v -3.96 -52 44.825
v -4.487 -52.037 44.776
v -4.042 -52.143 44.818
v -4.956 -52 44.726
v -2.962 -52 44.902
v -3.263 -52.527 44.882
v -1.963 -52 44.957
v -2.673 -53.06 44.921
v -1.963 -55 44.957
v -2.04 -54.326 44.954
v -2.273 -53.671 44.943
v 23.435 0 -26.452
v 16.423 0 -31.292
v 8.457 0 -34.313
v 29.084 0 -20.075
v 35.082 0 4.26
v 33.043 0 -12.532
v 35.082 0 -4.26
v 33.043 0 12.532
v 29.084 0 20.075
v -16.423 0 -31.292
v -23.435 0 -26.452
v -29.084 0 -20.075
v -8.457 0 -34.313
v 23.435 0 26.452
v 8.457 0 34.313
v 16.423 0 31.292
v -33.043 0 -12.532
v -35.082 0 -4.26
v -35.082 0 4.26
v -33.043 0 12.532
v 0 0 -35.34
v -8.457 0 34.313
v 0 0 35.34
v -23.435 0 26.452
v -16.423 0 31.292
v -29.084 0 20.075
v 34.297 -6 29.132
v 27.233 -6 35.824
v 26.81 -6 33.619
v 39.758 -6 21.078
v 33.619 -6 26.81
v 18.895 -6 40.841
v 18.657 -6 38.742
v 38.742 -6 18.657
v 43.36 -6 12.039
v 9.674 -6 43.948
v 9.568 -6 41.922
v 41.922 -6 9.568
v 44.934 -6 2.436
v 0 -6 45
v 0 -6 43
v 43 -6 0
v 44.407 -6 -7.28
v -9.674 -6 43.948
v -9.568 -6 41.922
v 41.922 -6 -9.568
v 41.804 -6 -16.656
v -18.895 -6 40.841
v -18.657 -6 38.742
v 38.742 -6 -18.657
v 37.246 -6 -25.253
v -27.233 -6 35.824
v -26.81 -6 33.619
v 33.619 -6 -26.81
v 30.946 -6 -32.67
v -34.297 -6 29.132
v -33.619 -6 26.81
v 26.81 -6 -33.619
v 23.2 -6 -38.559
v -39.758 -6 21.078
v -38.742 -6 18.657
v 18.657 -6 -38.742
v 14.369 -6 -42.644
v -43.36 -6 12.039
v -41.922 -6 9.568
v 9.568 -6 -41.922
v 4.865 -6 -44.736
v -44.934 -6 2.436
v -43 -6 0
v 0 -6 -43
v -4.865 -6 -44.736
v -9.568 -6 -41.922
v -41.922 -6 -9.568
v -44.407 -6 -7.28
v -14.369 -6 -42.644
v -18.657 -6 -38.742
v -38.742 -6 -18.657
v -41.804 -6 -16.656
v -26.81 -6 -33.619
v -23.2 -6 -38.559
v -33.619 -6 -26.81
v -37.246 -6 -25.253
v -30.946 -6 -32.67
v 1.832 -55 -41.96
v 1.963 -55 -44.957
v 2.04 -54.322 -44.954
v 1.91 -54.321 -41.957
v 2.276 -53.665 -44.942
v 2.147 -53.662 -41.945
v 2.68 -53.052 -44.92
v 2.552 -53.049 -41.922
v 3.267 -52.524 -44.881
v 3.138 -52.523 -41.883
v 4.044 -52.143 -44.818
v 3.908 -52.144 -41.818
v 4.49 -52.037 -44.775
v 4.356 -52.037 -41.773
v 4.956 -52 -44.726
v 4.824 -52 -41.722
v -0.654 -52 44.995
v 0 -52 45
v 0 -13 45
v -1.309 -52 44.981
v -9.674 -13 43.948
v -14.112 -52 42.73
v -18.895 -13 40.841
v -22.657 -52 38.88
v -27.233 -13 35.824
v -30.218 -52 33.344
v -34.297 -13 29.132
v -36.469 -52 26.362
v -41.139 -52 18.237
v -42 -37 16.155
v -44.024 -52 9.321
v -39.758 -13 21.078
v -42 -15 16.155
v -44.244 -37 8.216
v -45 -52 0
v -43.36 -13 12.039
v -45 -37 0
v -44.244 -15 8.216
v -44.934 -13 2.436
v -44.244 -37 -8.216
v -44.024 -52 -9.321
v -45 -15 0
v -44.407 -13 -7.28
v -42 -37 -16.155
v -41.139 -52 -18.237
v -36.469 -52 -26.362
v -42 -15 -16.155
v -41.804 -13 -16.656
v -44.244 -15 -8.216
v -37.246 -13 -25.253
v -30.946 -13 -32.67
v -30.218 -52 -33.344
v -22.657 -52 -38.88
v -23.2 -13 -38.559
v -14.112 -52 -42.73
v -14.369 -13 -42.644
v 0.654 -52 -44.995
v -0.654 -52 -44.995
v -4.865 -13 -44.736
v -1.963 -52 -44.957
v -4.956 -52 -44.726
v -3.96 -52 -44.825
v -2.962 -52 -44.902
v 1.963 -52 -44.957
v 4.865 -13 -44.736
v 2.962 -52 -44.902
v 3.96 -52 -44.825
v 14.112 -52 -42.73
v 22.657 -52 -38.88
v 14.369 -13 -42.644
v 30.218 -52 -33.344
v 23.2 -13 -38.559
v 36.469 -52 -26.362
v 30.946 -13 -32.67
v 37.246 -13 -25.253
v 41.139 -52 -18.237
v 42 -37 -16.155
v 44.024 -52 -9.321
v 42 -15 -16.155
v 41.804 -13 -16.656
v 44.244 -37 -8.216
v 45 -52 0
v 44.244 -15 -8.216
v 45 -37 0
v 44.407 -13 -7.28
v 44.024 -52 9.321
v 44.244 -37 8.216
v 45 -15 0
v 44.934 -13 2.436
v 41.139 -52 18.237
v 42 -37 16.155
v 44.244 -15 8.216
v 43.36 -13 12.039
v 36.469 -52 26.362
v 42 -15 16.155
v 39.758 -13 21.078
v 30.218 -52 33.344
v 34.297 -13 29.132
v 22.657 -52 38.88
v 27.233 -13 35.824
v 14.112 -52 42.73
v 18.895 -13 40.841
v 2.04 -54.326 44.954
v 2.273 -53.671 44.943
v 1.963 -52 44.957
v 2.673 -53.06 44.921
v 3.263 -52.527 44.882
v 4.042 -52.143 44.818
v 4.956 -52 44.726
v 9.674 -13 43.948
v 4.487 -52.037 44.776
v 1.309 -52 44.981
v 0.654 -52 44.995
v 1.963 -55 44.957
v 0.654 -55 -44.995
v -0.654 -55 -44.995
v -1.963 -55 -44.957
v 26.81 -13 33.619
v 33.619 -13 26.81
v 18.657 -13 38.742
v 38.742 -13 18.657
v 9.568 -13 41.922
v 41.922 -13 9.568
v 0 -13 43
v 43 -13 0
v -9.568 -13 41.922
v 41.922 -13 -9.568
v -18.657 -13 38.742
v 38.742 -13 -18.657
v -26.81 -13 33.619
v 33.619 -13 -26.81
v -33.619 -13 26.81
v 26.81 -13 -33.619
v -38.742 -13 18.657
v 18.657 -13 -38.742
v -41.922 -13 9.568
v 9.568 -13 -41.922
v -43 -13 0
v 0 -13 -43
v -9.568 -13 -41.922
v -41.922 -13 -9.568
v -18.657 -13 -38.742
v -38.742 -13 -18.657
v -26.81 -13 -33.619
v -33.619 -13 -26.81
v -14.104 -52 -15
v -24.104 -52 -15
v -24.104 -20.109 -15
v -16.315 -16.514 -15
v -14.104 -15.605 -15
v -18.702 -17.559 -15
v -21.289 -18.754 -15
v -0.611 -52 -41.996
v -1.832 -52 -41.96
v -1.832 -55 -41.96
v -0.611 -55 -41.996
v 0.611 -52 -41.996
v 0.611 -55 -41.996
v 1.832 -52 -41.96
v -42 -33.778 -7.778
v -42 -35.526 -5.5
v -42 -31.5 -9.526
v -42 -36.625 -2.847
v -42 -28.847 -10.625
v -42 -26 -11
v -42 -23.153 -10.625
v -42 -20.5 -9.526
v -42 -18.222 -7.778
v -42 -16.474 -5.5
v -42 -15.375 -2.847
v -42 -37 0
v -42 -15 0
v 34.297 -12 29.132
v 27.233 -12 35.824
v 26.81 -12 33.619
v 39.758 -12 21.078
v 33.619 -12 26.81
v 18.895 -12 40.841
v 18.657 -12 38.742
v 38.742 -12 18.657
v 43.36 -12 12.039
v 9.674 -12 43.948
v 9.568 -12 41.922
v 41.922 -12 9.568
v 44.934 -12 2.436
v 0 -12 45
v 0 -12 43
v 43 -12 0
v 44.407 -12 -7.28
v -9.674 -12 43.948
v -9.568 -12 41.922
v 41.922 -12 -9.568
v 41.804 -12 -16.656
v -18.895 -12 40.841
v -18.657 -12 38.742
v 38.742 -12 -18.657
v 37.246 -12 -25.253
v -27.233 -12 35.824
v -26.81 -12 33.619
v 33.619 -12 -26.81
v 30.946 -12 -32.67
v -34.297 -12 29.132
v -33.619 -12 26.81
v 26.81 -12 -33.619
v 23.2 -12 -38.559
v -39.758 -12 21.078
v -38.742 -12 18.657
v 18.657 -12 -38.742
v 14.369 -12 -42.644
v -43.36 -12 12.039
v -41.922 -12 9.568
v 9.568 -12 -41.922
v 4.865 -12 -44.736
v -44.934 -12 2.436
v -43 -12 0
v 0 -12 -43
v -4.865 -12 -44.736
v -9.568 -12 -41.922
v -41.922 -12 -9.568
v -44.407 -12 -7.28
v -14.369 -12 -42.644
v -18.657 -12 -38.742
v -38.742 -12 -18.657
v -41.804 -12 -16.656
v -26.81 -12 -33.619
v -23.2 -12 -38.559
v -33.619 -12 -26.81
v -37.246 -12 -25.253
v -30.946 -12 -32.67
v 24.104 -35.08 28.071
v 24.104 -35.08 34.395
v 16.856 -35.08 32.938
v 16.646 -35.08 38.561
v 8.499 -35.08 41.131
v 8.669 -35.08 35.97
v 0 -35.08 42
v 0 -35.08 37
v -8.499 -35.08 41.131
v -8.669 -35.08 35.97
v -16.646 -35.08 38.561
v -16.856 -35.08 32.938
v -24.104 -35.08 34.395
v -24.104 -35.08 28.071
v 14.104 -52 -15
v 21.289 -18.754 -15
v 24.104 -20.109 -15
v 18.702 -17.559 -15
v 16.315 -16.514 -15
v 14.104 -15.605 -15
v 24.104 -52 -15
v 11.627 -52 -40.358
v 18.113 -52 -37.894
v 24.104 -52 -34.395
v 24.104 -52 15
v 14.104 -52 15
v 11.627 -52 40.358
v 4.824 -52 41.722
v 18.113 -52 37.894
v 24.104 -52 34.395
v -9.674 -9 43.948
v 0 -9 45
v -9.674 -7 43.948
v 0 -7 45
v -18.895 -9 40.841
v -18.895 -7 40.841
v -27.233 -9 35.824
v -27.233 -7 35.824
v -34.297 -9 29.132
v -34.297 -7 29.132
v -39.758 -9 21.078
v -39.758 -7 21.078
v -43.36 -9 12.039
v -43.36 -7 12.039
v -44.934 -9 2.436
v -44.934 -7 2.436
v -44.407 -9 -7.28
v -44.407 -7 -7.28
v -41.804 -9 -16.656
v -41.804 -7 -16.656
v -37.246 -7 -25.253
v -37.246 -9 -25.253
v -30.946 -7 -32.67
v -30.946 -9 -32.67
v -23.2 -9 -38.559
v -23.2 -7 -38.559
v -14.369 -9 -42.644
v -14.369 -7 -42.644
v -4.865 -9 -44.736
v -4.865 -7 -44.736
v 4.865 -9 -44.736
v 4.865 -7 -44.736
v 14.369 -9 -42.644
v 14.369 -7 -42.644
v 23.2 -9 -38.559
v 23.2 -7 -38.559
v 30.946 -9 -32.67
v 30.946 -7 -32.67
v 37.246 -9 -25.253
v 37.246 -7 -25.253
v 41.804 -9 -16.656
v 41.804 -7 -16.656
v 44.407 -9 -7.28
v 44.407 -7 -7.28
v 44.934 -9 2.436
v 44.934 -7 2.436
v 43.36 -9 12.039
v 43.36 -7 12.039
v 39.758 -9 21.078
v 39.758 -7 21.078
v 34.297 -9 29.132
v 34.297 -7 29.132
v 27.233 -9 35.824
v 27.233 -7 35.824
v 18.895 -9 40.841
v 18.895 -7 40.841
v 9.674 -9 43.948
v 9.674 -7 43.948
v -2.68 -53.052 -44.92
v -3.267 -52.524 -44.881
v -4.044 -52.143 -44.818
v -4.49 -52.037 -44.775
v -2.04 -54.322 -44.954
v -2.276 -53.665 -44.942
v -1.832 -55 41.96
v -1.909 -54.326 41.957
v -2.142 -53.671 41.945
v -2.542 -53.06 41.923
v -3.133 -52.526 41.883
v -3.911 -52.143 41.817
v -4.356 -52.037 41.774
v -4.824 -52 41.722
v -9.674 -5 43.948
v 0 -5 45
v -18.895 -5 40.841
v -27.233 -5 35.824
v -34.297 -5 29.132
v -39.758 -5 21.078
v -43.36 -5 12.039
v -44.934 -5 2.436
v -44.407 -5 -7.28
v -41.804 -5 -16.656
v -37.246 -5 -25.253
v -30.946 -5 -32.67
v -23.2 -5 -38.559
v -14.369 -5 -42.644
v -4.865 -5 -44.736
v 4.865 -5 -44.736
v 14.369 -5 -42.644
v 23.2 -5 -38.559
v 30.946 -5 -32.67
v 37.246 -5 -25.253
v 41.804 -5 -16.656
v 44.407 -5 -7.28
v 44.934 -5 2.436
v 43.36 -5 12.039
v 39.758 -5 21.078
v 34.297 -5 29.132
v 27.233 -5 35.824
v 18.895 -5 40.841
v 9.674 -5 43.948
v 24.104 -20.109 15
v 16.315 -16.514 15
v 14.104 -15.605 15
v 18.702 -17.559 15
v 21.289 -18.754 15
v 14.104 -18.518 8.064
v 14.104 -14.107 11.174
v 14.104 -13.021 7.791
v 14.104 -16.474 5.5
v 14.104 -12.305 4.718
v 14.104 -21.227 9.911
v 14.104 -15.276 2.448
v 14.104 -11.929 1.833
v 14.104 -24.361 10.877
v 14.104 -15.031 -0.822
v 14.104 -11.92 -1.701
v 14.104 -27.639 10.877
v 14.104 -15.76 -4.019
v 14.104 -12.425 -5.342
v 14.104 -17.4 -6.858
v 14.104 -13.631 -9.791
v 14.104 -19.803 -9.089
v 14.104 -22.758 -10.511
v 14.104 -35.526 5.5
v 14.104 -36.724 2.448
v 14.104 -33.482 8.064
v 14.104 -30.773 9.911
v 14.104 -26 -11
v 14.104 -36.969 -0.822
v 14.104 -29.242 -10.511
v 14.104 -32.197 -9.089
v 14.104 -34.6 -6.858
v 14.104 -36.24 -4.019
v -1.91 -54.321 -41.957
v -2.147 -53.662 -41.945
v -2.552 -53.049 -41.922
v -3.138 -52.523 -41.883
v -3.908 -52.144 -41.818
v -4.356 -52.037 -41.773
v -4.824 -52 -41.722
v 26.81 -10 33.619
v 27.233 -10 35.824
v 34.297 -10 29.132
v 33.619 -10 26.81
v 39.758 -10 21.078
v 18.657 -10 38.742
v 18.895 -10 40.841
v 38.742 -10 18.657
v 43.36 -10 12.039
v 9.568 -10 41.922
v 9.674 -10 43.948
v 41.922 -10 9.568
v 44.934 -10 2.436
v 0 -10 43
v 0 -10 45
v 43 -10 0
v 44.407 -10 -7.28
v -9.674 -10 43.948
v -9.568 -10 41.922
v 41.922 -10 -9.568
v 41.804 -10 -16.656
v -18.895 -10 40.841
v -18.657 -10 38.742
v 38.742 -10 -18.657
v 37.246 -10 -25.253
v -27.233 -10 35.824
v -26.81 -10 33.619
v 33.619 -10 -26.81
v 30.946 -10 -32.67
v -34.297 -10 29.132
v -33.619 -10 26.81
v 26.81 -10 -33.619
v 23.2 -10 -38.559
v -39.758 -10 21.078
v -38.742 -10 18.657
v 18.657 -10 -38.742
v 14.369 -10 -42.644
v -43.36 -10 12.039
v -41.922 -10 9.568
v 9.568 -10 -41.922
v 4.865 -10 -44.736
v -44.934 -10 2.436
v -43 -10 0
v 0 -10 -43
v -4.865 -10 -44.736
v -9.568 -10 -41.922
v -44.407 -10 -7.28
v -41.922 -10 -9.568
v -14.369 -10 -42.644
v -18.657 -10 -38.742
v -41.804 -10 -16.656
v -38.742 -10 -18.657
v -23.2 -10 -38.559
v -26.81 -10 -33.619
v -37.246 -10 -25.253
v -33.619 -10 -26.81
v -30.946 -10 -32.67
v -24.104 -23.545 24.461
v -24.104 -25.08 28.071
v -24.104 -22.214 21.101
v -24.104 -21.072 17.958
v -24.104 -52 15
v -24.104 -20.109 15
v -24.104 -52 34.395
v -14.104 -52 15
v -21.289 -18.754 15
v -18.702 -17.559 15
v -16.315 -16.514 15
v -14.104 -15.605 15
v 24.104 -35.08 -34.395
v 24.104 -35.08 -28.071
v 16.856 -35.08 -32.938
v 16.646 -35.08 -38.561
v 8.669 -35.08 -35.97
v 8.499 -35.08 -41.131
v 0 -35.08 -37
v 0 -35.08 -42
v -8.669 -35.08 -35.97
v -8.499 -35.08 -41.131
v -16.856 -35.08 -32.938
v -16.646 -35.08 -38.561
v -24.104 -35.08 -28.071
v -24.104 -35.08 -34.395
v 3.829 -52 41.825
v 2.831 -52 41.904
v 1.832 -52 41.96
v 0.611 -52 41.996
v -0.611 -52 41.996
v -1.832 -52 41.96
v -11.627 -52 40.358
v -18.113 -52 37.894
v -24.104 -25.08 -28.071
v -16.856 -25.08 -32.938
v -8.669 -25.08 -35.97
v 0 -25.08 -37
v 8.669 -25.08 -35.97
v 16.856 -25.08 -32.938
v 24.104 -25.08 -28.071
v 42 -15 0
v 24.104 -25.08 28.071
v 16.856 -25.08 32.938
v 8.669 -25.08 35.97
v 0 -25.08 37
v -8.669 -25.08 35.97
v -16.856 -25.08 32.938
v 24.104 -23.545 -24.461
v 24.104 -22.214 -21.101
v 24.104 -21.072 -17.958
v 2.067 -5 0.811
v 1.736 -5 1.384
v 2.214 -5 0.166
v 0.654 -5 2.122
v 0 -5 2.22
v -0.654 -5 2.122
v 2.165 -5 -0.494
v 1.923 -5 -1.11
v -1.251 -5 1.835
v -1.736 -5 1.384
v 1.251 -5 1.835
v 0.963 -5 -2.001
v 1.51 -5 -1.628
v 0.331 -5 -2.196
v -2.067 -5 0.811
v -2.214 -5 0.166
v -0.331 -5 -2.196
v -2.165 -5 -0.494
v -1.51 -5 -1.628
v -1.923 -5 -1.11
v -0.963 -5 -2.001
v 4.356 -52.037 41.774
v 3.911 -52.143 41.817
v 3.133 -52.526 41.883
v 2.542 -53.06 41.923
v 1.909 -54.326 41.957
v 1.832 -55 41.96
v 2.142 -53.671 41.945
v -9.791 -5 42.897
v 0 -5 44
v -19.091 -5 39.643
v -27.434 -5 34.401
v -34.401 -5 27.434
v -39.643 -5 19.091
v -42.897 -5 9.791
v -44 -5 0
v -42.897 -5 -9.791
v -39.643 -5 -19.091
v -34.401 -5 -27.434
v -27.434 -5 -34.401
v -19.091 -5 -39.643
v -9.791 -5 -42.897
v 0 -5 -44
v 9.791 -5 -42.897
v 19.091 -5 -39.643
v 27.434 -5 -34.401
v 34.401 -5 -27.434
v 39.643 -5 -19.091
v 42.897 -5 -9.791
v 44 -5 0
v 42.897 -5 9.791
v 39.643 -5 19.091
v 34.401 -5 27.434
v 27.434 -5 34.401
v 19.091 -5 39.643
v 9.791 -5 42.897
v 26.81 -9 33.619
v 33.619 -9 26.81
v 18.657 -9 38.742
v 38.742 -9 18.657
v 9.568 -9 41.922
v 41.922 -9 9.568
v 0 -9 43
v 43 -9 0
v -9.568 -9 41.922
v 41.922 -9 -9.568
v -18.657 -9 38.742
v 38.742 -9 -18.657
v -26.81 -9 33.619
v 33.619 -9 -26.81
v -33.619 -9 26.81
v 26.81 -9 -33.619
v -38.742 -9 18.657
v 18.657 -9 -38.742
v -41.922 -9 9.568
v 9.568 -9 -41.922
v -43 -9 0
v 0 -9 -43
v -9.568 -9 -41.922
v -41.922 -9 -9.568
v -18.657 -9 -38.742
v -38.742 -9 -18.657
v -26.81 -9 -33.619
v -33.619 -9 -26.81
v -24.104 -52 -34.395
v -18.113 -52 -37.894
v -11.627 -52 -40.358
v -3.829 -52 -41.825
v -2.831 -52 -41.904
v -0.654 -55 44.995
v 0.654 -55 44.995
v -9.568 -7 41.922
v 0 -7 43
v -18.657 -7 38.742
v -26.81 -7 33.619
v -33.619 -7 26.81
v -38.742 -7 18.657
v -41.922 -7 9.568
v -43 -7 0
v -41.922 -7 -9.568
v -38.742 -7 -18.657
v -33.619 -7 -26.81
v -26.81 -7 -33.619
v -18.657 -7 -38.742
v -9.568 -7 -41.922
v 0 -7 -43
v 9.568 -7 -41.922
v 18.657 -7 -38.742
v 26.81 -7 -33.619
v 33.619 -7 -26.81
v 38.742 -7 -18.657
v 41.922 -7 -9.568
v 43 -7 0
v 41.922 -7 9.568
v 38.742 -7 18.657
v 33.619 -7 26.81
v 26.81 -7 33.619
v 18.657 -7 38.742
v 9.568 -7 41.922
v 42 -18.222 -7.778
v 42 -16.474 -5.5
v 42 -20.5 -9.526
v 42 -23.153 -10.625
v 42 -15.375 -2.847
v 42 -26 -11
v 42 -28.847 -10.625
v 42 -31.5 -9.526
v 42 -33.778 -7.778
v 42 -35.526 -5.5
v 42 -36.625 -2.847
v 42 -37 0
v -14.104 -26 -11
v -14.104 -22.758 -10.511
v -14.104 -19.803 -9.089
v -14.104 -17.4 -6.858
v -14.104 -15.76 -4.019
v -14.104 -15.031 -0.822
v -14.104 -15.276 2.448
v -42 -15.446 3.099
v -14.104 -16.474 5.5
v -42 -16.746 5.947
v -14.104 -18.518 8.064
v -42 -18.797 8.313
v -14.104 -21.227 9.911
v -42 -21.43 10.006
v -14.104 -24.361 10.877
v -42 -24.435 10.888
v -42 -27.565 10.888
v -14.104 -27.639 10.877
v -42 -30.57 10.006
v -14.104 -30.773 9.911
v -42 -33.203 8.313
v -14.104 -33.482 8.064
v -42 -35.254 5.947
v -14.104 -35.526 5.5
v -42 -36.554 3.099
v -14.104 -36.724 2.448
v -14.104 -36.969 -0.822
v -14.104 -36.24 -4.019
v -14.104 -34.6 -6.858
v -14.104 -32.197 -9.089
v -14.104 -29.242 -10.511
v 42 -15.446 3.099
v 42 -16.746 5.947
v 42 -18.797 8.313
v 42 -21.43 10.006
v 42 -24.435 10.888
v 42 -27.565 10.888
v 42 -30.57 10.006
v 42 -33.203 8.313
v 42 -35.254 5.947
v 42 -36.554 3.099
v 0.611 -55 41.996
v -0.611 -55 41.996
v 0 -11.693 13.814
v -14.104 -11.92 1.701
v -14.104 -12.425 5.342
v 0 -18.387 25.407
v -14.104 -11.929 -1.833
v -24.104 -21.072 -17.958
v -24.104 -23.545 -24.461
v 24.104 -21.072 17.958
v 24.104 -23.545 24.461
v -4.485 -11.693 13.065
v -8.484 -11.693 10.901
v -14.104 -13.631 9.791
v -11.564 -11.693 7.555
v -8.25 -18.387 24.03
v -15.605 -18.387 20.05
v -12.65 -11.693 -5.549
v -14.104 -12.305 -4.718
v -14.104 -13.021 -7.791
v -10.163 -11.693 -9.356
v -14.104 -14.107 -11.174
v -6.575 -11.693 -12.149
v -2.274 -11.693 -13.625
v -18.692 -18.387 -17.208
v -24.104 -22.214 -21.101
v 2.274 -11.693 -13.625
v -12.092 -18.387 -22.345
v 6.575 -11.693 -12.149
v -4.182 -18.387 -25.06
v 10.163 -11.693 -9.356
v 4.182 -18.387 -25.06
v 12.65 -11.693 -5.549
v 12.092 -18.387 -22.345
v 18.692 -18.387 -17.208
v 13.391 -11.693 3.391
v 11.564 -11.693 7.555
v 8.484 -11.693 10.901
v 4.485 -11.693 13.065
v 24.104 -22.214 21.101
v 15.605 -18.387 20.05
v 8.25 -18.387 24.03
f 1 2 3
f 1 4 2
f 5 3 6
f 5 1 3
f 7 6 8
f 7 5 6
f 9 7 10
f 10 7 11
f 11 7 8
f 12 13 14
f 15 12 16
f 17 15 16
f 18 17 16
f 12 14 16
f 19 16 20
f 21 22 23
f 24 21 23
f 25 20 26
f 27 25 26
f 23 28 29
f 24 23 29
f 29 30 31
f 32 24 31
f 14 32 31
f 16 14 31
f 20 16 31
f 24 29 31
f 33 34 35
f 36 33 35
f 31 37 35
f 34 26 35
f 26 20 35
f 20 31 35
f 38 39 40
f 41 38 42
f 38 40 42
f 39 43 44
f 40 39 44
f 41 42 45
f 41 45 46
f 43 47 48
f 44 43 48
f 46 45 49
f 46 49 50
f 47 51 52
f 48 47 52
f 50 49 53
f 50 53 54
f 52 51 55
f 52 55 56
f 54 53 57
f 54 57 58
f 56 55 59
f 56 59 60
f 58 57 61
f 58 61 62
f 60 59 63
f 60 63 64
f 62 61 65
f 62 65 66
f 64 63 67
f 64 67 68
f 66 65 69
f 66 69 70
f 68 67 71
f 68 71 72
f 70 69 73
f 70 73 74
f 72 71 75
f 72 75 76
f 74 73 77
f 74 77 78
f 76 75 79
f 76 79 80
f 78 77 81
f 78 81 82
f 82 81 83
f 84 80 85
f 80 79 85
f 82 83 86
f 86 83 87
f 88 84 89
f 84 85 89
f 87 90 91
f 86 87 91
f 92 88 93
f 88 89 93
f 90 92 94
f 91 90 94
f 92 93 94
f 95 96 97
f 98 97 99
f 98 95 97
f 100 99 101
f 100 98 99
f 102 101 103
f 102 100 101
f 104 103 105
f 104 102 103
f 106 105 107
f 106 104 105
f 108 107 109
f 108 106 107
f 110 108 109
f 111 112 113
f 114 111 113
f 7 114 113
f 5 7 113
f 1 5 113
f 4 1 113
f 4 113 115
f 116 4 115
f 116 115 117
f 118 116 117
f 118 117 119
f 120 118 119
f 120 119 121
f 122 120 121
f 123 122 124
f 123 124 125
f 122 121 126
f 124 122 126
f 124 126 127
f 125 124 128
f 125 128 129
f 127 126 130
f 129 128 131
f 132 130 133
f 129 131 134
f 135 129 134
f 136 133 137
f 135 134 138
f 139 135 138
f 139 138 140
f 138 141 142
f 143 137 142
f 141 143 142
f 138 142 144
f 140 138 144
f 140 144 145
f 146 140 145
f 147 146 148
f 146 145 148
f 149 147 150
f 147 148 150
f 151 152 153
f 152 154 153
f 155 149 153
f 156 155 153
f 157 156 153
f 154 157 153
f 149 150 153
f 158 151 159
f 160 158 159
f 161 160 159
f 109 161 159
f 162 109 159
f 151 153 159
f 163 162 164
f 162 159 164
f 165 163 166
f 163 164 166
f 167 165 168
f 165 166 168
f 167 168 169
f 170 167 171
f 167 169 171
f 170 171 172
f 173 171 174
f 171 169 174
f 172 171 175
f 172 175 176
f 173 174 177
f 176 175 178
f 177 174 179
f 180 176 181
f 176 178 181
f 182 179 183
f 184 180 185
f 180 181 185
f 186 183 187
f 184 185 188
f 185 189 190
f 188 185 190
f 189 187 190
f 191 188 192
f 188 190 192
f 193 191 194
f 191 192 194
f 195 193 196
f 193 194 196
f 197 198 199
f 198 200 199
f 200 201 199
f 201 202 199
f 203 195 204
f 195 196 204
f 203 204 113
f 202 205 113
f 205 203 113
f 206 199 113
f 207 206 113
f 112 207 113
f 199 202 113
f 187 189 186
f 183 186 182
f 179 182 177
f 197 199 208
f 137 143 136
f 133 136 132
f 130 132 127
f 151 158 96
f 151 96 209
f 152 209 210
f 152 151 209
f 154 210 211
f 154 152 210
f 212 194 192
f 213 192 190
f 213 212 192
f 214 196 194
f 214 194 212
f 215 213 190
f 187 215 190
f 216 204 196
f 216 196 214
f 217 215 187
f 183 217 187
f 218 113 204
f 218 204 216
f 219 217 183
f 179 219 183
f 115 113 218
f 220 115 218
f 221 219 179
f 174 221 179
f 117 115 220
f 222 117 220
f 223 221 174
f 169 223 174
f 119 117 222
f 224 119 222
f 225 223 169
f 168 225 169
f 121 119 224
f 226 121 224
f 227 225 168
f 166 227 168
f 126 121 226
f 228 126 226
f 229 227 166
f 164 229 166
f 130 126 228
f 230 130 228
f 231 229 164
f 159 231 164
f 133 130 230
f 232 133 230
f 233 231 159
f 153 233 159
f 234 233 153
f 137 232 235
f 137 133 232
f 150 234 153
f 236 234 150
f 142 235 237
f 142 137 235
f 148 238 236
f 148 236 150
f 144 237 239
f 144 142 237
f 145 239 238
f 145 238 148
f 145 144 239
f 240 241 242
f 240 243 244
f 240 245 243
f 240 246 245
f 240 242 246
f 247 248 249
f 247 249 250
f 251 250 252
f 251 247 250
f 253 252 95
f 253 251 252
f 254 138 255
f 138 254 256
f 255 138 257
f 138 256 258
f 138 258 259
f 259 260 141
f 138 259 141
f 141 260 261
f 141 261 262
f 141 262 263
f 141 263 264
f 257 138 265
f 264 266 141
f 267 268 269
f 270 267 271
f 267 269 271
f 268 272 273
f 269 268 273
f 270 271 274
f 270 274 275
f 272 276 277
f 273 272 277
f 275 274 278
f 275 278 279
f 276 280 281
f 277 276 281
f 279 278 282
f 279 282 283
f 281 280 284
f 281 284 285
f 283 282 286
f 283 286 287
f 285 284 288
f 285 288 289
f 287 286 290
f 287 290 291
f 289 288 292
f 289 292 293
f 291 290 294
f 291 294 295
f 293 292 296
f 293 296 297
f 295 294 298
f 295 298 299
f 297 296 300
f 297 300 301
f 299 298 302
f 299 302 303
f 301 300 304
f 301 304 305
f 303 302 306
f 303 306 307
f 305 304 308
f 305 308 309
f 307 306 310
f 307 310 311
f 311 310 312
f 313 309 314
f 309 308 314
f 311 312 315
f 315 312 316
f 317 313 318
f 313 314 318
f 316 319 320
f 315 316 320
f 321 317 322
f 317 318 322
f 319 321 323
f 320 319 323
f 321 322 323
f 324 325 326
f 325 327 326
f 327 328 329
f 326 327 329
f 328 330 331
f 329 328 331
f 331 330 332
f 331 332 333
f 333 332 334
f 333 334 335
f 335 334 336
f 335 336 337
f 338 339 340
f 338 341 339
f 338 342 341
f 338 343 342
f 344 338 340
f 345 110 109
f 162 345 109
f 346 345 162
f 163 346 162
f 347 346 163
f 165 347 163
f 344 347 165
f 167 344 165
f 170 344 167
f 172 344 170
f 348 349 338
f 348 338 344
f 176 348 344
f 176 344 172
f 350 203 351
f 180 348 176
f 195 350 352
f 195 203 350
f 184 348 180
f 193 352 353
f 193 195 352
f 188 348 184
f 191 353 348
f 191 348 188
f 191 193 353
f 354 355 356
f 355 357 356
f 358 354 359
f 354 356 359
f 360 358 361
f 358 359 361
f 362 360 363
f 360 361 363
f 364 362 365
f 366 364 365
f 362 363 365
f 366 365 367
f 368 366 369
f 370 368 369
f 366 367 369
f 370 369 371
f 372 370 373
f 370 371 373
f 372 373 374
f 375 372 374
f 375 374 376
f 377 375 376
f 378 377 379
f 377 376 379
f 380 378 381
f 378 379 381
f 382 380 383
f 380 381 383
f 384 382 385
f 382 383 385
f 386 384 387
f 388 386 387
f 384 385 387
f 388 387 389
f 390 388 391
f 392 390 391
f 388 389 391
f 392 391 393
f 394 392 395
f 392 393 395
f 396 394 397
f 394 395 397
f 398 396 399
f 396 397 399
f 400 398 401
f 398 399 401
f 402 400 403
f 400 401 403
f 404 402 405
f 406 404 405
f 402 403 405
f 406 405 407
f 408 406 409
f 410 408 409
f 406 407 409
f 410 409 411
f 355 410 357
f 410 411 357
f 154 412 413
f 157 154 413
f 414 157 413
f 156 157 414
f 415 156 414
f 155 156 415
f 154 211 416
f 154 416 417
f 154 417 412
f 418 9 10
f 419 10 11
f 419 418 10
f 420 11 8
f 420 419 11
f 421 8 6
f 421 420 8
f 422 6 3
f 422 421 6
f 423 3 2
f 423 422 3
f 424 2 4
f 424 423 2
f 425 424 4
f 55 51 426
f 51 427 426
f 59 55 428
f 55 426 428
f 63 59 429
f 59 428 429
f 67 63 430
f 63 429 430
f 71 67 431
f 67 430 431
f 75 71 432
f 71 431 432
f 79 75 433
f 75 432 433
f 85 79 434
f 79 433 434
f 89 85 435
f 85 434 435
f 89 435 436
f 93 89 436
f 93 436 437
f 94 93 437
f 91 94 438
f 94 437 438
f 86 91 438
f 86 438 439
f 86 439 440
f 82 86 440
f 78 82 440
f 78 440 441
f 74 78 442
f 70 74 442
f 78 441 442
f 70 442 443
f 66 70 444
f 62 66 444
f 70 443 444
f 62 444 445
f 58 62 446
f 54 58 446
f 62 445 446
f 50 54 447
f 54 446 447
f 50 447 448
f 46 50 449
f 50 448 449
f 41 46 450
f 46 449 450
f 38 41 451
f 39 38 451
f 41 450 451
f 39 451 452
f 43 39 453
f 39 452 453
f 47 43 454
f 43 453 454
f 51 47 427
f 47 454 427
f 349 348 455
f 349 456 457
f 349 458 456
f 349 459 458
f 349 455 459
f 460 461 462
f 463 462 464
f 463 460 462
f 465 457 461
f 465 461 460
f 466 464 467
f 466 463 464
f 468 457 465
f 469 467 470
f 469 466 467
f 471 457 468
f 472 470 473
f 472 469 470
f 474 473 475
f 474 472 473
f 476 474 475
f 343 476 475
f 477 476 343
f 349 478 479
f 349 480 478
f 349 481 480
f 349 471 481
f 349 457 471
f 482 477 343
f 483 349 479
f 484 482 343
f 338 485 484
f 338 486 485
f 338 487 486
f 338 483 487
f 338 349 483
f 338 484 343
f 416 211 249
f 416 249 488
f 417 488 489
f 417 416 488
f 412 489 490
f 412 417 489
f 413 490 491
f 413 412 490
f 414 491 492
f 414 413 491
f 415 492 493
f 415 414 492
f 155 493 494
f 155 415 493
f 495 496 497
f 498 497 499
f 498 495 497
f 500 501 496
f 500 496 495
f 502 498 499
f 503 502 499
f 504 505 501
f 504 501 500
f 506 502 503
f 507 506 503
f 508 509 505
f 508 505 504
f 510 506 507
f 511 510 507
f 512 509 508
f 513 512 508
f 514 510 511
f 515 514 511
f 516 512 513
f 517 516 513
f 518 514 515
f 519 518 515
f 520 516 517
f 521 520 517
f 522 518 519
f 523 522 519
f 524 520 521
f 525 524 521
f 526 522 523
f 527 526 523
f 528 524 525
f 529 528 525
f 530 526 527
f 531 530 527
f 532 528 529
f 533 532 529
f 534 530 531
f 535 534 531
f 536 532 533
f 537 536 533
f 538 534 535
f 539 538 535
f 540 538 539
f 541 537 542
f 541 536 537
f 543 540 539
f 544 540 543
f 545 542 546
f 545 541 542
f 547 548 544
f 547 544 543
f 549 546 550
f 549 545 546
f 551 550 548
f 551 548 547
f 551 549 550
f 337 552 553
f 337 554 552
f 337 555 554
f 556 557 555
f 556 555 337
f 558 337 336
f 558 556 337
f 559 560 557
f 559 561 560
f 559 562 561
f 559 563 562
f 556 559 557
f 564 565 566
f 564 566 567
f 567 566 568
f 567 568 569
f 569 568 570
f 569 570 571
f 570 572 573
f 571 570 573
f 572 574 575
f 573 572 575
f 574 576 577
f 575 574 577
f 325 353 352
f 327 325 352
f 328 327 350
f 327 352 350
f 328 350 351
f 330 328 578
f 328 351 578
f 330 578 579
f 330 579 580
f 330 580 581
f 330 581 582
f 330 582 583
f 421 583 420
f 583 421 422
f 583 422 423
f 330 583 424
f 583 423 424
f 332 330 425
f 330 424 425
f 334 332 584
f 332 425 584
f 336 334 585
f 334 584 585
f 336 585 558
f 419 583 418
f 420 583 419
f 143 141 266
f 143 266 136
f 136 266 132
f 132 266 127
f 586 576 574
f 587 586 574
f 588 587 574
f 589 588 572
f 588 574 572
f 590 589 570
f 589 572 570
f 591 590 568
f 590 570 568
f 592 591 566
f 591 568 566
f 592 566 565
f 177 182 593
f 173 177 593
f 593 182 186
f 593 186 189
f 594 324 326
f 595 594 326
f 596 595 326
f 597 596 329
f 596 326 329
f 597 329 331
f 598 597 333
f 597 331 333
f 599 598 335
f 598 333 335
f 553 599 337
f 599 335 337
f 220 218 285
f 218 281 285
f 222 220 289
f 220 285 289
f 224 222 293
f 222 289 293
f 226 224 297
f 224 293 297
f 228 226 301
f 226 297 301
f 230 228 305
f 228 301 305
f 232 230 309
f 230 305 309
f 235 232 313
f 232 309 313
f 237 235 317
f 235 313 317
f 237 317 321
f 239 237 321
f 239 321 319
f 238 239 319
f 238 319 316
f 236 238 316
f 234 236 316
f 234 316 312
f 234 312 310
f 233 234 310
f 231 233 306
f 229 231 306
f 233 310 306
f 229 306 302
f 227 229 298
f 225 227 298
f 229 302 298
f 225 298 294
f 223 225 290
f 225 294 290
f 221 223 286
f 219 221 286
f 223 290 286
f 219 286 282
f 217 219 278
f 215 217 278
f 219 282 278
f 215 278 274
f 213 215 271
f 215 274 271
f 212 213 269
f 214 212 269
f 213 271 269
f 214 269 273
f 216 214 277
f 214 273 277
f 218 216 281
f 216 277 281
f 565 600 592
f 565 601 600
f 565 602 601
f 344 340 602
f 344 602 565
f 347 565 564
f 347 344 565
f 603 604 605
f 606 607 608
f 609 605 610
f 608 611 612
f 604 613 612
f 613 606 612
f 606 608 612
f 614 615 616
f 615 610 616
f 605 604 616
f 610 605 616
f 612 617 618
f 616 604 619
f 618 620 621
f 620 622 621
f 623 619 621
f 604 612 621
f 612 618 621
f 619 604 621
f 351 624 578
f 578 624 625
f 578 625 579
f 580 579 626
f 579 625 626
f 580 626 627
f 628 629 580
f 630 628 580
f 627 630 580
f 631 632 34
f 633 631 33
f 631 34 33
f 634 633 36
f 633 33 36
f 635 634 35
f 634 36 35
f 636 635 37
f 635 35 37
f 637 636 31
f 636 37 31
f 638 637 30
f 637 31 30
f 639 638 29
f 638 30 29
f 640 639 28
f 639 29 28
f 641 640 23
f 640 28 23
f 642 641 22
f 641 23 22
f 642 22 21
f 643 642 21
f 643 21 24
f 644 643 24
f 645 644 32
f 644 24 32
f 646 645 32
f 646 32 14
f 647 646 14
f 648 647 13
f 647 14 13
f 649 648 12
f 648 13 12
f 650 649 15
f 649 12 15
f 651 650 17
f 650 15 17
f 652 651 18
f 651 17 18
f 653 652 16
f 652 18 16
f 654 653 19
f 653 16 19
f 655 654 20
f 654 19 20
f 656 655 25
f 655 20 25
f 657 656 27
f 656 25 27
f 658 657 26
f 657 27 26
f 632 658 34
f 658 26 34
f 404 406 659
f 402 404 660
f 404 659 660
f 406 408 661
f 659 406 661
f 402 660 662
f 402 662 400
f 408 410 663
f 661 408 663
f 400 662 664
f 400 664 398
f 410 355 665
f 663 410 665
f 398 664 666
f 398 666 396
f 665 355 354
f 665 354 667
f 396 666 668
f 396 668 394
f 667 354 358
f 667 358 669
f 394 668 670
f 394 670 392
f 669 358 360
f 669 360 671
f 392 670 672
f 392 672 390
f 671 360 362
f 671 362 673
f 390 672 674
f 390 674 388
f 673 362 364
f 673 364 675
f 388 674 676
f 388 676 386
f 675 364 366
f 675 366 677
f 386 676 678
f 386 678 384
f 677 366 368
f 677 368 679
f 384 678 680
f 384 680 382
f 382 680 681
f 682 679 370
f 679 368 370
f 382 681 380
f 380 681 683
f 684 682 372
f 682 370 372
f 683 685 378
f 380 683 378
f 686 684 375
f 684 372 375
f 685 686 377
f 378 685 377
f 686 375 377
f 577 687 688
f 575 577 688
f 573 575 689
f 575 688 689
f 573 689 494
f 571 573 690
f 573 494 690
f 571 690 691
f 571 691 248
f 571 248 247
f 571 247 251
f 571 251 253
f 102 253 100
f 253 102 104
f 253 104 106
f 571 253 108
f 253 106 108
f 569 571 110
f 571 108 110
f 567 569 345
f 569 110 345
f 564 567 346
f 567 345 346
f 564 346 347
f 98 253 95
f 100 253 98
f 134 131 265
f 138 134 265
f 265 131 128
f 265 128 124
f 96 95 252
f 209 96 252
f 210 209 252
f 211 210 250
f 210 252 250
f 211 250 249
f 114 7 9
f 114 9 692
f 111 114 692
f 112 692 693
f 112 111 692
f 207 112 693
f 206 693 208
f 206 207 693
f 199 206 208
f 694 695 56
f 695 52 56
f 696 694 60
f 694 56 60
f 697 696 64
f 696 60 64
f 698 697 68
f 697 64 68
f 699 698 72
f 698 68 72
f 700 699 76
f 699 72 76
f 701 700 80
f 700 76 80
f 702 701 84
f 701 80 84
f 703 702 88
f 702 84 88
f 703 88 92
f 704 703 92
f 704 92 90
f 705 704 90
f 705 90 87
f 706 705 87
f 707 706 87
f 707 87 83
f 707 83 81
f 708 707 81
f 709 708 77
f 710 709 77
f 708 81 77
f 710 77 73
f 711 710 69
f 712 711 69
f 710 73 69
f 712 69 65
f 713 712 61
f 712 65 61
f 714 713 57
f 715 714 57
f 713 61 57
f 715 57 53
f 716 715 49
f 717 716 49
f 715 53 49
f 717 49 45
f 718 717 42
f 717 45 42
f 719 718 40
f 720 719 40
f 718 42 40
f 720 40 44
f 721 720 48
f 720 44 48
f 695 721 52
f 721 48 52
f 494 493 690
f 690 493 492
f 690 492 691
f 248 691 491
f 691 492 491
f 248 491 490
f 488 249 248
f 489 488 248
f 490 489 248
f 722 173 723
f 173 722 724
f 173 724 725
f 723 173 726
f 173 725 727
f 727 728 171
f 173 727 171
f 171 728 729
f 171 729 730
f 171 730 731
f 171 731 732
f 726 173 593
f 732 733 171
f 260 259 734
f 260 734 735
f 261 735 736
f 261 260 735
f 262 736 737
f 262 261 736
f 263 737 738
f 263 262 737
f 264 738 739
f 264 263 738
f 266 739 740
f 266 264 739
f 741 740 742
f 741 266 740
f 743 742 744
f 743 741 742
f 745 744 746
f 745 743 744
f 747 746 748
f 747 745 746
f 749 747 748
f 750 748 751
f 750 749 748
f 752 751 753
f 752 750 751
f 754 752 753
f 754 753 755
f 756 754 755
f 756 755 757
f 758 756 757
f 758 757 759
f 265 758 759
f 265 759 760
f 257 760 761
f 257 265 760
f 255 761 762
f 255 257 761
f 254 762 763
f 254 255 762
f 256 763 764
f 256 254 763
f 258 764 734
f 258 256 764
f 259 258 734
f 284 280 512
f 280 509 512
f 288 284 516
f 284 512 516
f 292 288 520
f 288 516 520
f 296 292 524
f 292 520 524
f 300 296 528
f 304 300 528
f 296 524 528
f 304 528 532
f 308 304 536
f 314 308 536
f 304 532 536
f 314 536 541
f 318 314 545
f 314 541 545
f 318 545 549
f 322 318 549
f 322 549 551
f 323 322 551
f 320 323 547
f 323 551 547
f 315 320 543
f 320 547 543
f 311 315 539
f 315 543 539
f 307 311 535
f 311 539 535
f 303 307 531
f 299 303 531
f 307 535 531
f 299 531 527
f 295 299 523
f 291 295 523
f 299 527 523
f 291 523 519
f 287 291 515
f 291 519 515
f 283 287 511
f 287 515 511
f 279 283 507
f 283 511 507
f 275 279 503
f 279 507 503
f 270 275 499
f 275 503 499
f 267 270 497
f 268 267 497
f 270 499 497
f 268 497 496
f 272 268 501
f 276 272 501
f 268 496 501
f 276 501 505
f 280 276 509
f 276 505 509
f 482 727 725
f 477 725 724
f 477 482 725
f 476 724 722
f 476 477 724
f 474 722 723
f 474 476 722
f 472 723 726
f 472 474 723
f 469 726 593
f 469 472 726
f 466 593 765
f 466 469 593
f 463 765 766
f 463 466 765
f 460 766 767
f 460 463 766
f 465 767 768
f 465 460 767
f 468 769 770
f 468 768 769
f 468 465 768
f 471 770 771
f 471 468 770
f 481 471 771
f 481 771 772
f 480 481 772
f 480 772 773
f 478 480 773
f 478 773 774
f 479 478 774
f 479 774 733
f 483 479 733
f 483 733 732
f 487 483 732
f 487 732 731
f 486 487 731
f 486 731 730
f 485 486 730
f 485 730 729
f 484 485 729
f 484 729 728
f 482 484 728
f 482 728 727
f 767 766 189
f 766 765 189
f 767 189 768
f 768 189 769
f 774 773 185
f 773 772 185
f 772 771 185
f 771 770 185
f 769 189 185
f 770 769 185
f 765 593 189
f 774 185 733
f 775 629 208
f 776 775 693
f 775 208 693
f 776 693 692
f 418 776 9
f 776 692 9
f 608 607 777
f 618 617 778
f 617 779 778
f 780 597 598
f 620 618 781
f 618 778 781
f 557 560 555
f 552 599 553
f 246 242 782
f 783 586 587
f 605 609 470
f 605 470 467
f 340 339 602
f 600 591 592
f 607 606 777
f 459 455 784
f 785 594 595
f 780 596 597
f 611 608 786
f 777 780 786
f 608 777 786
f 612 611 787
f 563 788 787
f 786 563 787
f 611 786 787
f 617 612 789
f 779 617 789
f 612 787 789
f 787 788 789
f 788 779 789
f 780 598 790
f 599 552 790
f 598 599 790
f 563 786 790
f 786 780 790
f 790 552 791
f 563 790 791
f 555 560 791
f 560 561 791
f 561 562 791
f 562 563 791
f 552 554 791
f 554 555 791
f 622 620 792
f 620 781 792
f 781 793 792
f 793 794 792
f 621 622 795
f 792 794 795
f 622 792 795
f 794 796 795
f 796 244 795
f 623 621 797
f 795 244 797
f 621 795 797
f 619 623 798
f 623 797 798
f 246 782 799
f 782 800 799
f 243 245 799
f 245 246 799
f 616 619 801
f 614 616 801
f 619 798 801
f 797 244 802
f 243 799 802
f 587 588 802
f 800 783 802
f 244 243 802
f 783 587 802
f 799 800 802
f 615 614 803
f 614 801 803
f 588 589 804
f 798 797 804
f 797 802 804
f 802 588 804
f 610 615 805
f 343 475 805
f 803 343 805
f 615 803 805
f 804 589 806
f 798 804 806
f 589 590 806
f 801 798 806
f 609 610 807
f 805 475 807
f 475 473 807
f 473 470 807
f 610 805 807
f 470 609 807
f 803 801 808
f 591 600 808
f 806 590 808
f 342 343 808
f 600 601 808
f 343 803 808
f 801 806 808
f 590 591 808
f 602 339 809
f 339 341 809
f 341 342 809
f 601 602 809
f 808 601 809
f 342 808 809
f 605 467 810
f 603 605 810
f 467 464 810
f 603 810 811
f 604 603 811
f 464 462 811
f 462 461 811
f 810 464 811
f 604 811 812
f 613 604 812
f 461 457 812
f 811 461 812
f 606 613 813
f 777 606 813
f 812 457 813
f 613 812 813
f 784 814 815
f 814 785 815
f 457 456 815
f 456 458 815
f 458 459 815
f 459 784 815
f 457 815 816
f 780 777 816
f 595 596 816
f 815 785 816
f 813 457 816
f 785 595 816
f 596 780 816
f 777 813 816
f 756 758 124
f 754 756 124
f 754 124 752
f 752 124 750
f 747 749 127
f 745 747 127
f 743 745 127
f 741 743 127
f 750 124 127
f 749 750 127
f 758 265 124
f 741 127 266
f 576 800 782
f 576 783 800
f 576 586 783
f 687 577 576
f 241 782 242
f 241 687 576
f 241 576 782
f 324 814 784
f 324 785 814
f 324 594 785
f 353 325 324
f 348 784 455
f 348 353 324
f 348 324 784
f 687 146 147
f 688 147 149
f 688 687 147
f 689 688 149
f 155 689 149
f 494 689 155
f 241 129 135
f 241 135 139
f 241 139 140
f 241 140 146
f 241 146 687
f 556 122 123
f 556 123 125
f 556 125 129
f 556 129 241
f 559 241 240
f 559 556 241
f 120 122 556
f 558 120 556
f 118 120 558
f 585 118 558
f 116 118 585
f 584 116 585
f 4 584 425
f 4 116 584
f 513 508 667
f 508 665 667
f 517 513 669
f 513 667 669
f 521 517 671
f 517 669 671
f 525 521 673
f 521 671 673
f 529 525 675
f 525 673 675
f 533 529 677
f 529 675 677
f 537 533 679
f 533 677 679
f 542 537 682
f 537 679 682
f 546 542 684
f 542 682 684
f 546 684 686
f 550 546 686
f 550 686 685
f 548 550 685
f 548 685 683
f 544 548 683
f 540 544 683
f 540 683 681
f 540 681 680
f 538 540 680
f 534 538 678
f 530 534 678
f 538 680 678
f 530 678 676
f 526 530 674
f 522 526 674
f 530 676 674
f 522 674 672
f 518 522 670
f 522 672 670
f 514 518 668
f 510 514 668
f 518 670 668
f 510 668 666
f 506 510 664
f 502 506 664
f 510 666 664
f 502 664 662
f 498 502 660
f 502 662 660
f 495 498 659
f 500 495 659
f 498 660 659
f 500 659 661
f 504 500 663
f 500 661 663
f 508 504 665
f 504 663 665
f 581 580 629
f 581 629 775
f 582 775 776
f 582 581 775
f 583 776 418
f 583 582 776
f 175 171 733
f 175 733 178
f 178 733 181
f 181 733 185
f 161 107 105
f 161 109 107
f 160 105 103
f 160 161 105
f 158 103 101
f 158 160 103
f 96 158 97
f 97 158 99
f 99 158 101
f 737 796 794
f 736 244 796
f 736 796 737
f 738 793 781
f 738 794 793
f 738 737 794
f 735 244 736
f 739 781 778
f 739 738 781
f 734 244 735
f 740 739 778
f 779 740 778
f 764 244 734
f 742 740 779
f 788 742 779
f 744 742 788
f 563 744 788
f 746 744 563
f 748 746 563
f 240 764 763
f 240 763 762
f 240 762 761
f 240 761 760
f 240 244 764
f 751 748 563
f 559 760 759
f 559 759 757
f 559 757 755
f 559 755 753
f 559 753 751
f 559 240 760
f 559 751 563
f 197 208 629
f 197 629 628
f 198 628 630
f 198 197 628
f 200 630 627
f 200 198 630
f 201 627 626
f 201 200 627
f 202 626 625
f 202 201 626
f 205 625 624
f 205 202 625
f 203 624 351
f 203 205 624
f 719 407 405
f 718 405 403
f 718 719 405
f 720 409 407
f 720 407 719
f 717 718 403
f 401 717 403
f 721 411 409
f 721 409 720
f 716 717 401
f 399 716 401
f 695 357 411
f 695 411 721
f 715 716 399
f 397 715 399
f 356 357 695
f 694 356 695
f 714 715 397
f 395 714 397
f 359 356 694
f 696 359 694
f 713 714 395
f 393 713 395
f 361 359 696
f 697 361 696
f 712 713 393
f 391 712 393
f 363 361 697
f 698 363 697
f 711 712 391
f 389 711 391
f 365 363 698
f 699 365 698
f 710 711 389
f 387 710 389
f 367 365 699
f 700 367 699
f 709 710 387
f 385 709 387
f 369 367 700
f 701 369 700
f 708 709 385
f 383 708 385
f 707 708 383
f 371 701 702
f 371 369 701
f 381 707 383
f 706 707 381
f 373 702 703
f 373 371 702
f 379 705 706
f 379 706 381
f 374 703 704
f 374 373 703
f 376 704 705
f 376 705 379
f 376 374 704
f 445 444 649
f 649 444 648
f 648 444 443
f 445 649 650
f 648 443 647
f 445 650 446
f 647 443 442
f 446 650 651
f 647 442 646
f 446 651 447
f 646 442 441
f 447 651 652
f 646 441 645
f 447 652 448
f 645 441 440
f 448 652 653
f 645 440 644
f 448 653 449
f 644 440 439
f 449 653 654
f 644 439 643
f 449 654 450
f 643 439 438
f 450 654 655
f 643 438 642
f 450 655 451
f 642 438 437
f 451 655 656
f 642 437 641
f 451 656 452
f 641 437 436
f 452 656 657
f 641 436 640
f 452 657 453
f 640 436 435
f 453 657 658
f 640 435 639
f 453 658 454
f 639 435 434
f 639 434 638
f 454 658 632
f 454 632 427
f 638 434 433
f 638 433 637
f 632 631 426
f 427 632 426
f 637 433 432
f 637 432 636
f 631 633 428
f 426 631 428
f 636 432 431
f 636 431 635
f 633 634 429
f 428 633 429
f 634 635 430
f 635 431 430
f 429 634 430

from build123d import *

# Parameters (mm, degrees)
BOSS_EXTRUDE1_REACH     = 84.183
CUT_EXTRUDE1_DEPTH      = 91.676766104
CUT_EXTRUDE1_DEPTH_BACK = 91.676766104
GUDGEON_HOLE_R          = 11
CUT_EXTRUDE2_DEPTH      = 114.265175749
RING_CS_W               = 2
RING_CS_H               = 1
BOSS_EXTRUDE2_DEPTH     = 3
FILLET1_R               = 3


with BuildPart() as part:
    # Piston CS → Revolve1 (revolve)
    with BuildSketch(Plane.XY, mode=Mode.PRIVATE) as revolve1_sk:
        Polygon((0, 0), (0, -5), (2.220419784, -5), (37, -25.08), (37, -35.08), (42, -35.08), (42, -52), (45, -52), (45, -5), (44, -5), (35.339745962, 0), align=None)
    revolve(revolve1_sk.sketch.rotate(Axis((0, 0, 0), (0, -1, 0)), 90), axis=Axis((0, 0, 0), (0, -1, 0)))

    # Sketch5 → Boss-Extrude1 (add, up to next)
    with BuildSketch(Plane.XZ.offset(52), mode=Mode.PRIVATE) as boss_extrude1_sk1:
        with BuildLine():
            Line((-24.103941586, -38), (-24.103941586, -15))
            Line((-24.103941586, -15), (-14.103941586, -15))
            Line((-14.103941586, -15), (-14.103941586, 15))
            Line((-14.103941586, 15), (-24.103941586, 15))
            Line((-24.103941586, 15), (-24.103941586, 38))
            ThreePointArc((-24.103941586, 38), (-45, 0), (-24.103941586, -38))
        make_face()
    boss_extrude1_tool1 = extrude(boss_extrude1_sk1.sketch, amount=-BOSS_EXTRUDE1_REACH, mode=Mode.PRIVATE) - part.part
    # Sketch5 → Boss-Extrude1 (add, up to next)
    with BuildSketch(Plane.XZ.offset(52), mode=Mode.PRIVATE) as boss_extrude1_sk2:
        with BuildLine():
            Line((24.103941586, 38), (24.103941586, 15))
            Line((24.103941586, 15), (14.103941586, 15))
            Line((14.103941586, 15), (14.103941586, -15))
            Line((14.103941586, -15), (24.103941586, -15))
            Line((24.103941586, -15), (24.103941586, -38))
            ThreePointArc((24.103941586, -38), (45, 0), (24.103941586, 38))
        make_face()
    boss_extrude1_tool2 = extrude(boss_extrude1_sk2.sketch, amount=-BOSS_EXTRUDE1_REACH, mode=Mode.PRIVATE) - part.part
    add(boss_extrude1_tool1.solids().sort_by_distance((-29.792455, -52, 0))[0])
    add(boss_extrude1_tool2.solids().sort_by_distance((29.792455, -52, 0))[0])

    # Gudgeon Hole → Cut-Extrude1 (cut, two sides: drawn at the far end of the back side and taken through both)
    with BuildSketch(Plane(origin=(-14.103941586, 0, 0), x_dir=(0, 0, -1), z_dir=(1, 0, 0)).offset(-CUT_EXTRUDE1_DEPTH_BACK)):
        with Locations((0, -26)):
            Circle(GUDGEON_HOLE_R)
    extrude(amount=CUT_EXTRUDE1_DEPTH + CUT_EXTRUDE1_DEPTH_BACK, mode=Mode.SUBTRACT)

    # Gudgeon Hole Cutouts → Cut-Extrude2 (cut, through all)
    with BuildSketch(Plane.XY.offset(45)):
        with BuildLine():
            Line((-42, -15), (-45, -15))
            add(Edge.make_bspline(
                [(-45, -15), (-42.311111111, -26), (-45, -37)],
                knots=[0, 0, 0, 1, 1, 1], degree=2, weights=[0.034, 0.045, 0.056]))
            Line((-45, -37), (-42, -37))
            Line((-42, -37), (-42, -15))
        make_face()
        with BuildLine():
            Line((42, -37), (45, -37))
            add(Edge.make_bspline(
                [(45, -37), (42.311111111, -26), (45, -15)],
                knots=[0, 0, 0, 1, 1, 1], degree=2, weights=[0.034, 0.045, 0.056]))
            Line((45, -15), (42, -15))
            Line((42, -15), (42, -37))
        make_face()
    extrude(amount=-CUT_EXTRUDE2_DEPTH, mode=Mode.SUBTRACT)

    # Ring CS → Cut-Revolve1 (revolve, cut)
    with BuildSketch(Plane.XY, mode=Mode.PRIVATE) as cut_revolve1_sk:
        with Locations((44, -6.5)):
            Rectangle(RING_CS_W, RING_CS_H)
        with Locations((44, -9.5)):
            Rectangle(RING_CS_W, RING_CS_H)
        with Locations((44, -12.5)):
            Rectangle(RING_CS_W, RING_CS_H)
    revolve(cut_revolve1_sk.sketch.rotate(Axis((0, 0, 0), (0, -1, 0)), 90), axis=Axis((0, 0, 0), (0, -1, 0)), mode=Mode.SUBTRACT)

    # Sketch9 → Boss-Extrude2 (add)
    with BuildSketch(Plane.XZ.offset(52)):
        with BuildLine():
            Line((-1.832014269, 41.960025306), (-1.962872431, 44.957169971))
            ThreePointArc((-1.962872431, 44.957169971), (0, 45), (1.962872431, 44.957169971))
            Line((1.962872431, 44.957169971), (1.832014269, 41.960025306))
            ThreePointArc((1.832014269, 41.960025306), (0, 42), (-1.832014269, 41.960025306))
        make_face()
        with BuildLine():
            Line((1.832014269, -41.960025306), (1.962872431, -44.957169971))
            ThreePointArc((1.962872431, -44.957169971), (0, -45), (-1.962872431, -44.957169971))
            Line((-1.962872431, -44.957169971), (-1.832014269, -41.960025306))
            ThreePointArc((-1.832014269, -41.960025306), (0, -42), (1.832014269, -41.960025306))
        make_face()
    extrude(amount=BOSS_EXTRUDE2_DEPTH)

    # Fillet1
    # the kernel refuses this fillet: 3 mm, written as the material it adds along each edge
    with BuildSketch(Plane(origin=(-1.504868864, -52, 34.467163645), x_dir=(-0.999048221581858, 0, -0.043619387365329124), z_dir=(-0.043619387365329124, 0, 0.9990482215818581))) as fillet1_piece_1_section:
        with BuildLine():
            CenterArc((FILLET1_R, FILLET1_R), FILLET1_R, 180, 90)
            Line((0, FILLET1_R), (0, 0))
            Line((0, 0), (FILLET1_R, 0))
        make_face()
    fillet1_piece_1 = extrude(amount=18, mode=Mode.PRIVATE)
    fillet1_piece_1 = fillet1_piece_1 & Plane(origin=(0, -52.679071729, 0), x_dir=(0, 0, 1), z_dir=(0, 1, 0)) * Cylinder(45, 49, mode=Mode.PRIVATE)
    fillet1_piece_1 = fillet1_piece_1 - Plane(origin=(0, -52.679071729, 0), x_dir=(0, 0, 1), z_dir=(0, -1, 0)) * Cylinder(42, 49, mode=Mode.PRIVATE)
    add(fillet1_piece_1)
    with BuildSketch(Plane(origin=(2.290017837, -52, 52.450031633), x_dir=(0.9990482215818575, 0, -0.04361938736534308), z_dir=(-0.04361938736534308, 0, -0.9990482215818575))) as fillet1_piece_2_section:
        with BuildLine():
            CenterArc((FILLET1_R, FILLET1_R), FILLET1_R, 180, 90)
            Line((0, FILLET1_R), (0, 0))
            Line((0, 0), (FILLET1_R, 0))
        make_face()
    fillet1_piece_2 = extrude(amount=18, mode=Mode.PRIVATE)
    fillet1_piece_2 = fillet1_piece_2 - Plane(origin=(0, -52.679065019, 0), x_dir=(0, 0, 1), z_dir=(0, -1, 0)) * Cylinder(42, 49, mode=Mode.PRIVATE)
    fillet1_piece_2 = fillet1_piece_2 & Plane(origin=(0, -52.679065019, 0), x_dir=(0, 0, 1), z_dir=(0, 1, 0)) * Cylinder(45, 49, mode=Mode.PRIVATE)
    add(fillet1_piece_2)
    with BuildSketch(Plane(origin=(1.504868864, -52, -34.467163645), x_dir=(0.9990482215818575, 0, 0.04361938736534308), z_dir=(0.04361938736534308, 0, -0.9990482215818575))) as fillet1_piece_3_section:
        with BuildLine():
            CenterArc((FILLET1_R, FILLET1_R), FILLET1_R, 180, 90)
            Line((0, FILLET1_R), (0, 0))
            Line((0, 0), (FILLET1_R, 0))
        make_face()
    fillet1_piece_3 = extrude(amount=18, mode=Mode.PRIVATE)
    fillet1_piece_3 = fillet1_piece_3 - Plane(origin=(0, -52.679069886, 0), x_dir=(0, 0, 1), z_dir=(0, -1, 0)) * Cylinder(42, 49, mode=Mode.PRIVATE)
    fillet1_piece_3 = fillet1_piece_3 & Plane(origin=(0, -52.679069886, 0), x_dir=(0, 0, 1), z_dir=(0, 1, 0)) * Cylinder(45, 49, mode=Mode.PRIVATE)
    add(fillet1_piece_3)
    with BuildSketch(Plane(origin=(-2.290017837, -52, -52.450031633), x_dir=(-0.999048221581858, 0, 0.04361938736532913), z_dir=(0.043619387365329124, 0, 0.9990482215818581))) as fillet1_piece_4_section:
        with BuildLine():
            CenterArc((FILLET1_R, FILLET1_R), FILLET1_R, 180, 90)
            Line((0, FILLET1_R), (0, 0))
            Line((0, 0), (FILLET1_R, 0))
        make_face()
    fillet1_piece_4 = extrude(amount=18, mode=Mode.PRIVATE)
    fillet1_piece_4 = fillet1_piece_4 - Plane(origin=(0, -52.679069383, 0), x_dir=(0, 0, 1), z_dir=(0, -1, 0)) * Cylinder(42, 49, mode=Mode.PRIVATE)
    fillet1_piece_4 = fillet1_piece_4 & Plane(origin=(0, -52.679069383, 0), x_dir=(0, 0, 1), z_dir=(0, 1, 0)) * Cylinder(45, 49, mode=Mode.PRIVATE)
    add(fillet1_piece_4)


solid = part.part
